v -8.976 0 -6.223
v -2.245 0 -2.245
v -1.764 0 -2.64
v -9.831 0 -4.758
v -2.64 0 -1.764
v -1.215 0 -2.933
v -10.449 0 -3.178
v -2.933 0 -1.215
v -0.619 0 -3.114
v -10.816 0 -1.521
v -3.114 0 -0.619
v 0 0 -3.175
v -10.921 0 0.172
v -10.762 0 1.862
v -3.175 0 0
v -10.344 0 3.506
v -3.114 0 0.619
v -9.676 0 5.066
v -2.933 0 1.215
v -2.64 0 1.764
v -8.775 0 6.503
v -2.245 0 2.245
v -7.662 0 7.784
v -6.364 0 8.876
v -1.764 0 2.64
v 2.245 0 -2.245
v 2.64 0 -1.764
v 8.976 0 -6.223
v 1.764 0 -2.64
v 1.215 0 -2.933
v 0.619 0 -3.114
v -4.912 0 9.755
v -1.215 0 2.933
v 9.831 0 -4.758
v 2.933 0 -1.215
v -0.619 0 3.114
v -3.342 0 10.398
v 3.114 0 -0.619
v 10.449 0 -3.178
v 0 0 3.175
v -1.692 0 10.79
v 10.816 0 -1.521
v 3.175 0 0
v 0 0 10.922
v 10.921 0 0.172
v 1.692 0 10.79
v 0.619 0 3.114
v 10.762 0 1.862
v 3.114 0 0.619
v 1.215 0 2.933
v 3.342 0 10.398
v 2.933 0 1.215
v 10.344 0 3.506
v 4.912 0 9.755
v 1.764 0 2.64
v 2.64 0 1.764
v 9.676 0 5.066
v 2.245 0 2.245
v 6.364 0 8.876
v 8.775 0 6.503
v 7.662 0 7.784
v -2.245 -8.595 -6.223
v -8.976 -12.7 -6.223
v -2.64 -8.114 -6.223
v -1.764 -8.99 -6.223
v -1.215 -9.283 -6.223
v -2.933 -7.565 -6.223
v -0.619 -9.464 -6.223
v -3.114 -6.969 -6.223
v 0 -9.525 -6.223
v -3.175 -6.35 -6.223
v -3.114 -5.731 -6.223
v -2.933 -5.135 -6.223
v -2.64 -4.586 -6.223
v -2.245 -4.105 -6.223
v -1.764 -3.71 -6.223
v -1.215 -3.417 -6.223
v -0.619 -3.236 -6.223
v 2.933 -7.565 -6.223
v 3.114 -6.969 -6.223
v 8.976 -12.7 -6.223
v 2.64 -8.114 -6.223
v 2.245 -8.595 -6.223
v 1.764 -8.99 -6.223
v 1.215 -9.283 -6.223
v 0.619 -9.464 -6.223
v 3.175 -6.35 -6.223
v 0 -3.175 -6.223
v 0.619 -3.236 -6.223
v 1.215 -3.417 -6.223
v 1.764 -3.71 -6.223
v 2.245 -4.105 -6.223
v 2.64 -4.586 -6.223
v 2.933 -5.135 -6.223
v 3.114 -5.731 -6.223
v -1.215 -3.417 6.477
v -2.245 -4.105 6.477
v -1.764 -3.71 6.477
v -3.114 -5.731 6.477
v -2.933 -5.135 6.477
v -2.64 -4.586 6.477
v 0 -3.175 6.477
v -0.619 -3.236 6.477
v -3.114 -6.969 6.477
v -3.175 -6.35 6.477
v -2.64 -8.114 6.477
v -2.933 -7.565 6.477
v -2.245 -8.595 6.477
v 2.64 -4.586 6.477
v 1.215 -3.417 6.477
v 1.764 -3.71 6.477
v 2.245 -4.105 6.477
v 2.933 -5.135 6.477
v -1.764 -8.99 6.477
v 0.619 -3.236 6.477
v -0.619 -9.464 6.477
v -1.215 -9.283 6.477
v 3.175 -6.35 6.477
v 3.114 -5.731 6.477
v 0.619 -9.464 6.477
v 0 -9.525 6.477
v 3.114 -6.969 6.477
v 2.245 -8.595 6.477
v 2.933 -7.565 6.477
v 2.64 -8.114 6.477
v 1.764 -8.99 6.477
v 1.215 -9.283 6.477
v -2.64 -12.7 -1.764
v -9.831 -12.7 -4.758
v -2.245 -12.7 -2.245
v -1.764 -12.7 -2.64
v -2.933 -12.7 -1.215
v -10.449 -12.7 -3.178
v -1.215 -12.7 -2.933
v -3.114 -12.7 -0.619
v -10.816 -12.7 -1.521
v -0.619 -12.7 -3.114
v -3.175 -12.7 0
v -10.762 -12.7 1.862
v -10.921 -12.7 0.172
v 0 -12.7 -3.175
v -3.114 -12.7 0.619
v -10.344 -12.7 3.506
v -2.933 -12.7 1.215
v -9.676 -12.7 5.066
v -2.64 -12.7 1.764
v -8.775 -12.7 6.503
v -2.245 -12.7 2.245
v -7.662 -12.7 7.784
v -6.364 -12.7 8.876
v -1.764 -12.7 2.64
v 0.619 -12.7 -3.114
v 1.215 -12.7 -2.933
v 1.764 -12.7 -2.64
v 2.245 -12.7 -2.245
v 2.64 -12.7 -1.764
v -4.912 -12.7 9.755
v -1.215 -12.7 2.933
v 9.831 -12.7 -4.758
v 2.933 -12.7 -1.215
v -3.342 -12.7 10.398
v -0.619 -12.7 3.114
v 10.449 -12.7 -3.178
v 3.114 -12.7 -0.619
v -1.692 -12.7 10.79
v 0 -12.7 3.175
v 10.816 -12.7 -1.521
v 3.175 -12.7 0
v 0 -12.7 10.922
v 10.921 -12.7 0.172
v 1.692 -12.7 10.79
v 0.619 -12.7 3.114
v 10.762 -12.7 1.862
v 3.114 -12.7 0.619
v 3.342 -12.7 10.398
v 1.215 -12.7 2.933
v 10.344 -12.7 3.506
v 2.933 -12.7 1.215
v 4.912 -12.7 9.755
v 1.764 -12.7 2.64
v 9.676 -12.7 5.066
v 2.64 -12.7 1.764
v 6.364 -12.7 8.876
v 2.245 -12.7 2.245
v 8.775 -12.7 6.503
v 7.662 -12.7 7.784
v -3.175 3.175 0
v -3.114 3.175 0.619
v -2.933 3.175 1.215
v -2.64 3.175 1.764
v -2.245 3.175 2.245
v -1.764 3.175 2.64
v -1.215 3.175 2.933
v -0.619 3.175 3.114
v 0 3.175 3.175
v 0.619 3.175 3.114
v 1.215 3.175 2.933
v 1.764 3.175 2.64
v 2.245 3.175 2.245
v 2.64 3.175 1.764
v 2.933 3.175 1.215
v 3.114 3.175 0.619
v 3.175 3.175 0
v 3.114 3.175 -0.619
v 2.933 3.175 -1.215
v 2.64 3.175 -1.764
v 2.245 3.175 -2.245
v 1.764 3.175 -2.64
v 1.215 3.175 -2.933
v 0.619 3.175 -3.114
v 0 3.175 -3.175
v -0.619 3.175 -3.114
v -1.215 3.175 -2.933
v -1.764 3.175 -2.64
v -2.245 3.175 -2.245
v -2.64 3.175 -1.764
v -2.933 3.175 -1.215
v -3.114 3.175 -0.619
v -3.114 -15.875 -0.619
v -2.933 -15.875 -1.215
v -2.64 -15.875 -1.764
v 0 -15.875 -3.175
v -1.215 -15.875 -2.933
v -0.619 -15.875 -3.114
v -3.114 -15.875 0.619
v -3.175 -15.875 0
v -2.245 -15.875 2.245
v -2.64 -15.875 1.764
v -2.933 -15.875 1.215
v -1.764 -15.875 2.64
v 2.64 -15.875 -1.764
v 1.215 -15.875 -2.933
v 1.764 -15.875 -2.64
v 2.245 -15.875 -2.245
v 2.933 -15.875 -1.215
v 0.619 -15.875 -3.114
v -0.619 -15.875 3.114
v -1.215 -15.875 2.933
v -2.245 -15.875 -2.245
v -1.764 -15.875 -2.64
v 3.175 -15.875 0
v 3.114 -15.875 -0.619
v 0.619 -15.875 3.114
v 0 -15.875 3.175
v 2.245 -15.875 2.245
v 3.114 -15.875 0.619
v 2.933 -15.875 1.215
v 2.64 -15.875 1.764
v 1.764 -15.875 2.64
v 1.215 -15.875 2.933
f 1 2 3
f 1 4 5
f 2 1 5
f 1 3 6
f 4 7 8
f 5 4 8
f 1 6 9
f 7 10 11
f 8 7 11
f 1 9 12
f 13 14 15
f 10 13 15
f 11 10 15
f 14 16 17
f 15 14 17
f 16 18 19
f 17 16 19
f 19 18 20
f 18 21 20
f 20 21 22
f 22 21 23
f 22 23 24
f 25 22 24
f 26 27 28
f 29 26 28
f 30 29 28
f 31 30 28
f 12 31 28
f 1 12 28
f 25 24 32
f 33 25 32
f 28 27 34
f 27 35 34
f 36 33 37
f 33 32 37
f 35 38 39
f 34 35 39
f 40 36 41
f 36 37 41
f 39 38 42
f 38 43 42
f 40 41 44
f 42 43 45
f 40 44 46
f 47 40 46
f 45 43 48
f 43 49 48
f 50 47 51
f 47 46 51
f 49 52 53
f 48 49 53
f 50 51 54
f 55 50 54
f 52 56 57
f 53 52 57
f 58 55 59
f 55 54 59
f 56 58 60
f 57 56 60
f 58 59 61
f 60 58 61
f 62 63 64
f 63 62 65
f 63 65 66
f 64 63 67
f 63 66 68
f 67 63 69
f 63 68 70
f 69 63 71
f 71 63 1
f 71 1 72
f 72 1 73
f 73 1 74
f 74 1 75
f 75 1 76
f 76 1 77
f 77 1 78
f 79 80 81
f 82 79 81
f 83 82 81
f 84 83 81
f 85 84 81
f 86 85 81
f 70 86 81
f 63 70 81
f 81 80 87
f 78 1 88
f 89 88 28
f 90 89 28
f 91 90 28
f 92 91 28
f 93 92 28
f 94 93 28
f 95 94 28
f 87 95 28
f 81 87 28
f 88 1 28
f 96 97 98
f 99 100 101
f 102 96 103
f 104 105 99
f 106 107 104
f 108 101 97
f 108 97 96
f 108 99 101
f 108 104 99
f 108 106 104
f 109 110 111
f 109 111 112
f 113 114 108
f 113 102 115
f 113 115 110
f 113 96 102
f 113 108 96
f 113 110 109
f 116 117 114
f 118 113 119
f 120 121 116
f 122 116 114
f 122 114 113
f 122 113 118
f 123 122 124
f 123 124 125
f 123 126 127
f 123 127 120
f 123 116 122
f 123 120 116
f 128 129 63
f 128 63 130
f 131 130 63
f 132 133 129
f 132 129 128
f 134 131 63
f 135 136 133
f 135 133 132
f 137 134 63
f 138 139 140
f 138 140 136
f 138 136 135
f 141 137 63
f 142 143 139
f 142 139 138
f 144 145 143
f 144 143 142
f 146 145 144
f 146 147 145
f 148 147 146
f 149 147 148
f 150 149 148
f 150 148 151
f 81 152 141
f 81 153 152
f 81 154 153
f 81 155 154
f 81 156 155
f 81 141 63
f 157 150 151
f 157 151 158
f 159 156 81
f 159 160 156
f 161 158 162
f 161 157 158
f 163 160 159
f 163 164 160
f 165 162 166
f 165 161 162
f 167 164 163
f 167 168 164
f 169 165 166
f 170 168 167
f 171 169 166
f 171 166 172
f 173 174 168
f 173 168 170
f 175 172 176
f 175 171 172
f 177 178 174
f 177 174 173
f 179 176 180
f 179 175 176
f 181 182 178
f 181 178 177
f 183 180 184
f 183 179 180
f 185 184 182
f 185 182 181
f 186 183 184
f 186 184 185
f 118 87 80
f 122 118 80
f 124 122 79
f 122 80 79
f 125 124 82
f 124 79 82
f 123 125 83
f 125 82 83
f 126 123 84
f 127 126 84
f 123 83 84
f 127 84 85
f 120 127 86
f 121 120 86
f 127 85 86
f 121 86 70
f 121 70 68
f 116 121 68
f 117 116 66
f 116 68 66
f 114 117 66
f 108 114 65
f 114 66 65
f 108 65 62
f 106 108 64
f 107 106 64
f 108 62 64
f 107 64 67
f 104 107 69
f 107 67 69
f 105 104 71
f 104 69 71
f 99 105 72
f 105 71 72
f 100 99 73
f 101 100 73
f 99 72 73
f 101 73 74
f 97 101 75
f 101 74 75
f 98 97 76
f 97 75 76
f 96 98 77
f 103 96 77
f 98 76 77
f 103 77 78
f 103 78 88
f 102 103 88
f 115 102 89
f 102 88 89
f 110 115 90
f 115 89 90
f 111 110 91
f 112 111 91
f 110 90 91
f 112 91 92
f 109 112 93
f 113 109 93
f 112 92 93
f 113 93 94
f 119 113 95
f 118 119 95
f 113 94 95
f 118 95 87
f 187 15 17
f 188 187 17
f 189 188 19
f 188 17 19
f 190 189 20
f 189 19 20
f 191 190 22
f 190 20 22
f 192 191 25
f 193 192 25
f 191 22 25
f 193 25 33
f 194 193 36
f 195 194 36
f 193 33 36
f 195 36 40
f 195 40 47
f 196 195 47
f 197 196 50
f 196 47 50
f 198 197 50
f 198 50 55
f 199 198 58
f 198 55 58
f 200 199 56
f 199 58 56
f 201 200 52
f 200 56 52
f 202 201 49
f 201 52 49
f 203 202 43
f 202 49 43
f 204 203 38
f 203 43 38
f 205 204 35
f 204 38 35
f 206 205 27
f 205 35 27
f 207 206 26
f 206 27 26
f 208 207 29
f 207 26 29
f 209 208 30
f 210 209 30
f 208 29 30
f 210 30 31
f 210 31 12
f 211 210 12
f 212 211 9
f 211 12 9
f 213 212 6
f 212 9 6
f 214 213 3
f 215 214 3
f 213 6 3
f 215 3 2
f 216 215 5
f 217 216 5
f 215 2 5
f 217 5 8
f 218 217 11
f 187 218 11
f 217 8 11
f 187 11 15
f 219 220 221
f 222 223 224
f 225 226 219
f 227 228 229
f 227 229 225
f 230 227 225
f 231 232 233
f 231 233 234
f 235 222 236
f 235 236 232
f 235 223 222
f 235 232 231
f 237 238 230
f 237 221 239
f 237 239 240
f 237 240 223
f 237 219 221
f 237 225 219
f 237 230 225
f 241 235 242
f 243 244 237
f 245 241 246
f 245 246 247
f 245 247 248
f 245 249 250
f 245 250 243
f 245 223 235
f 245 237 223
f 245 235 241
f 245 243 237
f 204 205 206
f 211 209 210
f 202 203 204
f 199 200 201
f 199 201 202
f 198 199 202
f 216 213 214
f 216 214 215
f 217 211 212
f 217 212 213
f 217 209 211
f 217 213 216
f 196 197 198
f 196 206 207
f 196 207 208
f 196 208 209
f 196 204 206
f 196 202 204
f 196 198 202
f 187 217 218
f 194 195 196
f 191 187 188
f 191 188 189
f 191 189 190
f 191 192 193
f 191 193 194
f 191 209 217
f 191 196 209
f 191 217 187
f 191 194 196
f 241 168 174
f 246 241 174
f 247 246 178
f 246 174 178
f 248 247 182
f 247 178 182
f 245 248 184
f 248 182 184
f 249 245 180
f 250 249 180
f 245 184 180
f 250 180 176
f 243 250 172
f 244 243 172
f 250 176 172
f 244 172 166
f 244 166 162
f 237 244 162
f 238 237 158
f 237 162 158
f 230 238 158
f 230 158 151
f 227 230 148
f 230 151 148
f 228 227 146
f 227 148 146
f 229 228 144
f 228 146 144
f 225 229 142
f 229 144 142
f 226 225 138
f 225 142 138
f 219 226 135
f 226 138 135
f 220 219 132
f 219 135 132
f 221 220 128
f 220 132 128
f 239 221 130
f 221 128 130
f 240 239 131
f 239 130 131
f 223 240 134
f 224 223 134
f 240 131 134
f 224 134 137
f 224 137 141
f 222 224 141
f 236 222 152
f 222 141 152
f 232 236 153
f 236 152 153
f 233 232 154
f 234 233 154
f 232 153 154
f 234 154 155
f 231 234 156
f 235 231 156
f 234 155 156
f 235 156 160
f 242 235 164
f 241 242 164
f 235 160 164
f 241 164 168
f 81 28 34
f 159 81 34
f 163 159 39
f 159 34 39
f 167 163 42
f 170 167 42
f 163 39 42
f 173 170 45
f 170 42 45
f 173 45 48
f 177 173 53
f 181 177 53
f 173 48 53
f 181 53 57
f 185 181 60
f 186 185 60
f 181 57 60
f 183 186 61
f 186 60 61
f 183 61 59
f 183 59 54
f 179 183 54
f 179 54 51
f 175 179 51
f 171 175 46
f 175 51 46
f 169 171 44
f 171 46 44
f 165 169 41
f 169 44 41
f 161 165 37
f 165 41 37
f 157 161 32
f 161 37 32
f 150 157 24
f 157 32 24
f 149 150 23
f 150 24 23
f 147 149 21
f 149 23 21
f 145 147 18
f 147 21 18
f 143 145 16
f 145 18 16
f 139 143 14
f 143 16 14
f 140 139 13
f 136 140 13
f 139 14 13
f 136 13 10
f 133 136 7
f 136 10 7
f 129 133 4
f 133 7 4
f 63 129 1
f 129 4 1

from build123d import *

# Parameters (mm, degrees)
F1_DEPTH = 12.7
F2_R     = 3.175
F3_DEPTH = 3.175
F4_R     = 3.175
F5_DEPTH = 3.175
F6_R     = 3.175
F7_DEPTH = 12.7


with BuildPart() as f1:
    # F0 (on Front) → F1 (new body)
    with BuildSketch(Plane.XZ):
        with BuildLine():
            Line((-8.975765, -6.223), (8.975765, -6.223))
            ThreePointArc((8.975765, -6.223), (0, 10.922), (-8.975765, -6.223))
        make_face()
    extrude(amount=F1_DEPTH)

    # F2 (on face) → F3 (join)
    with BuildSketch(Plane.XZ.offset(12.7)):
        Circle(F2_R)
    extrude(amount=F3_DEPTH)

    # F4 (on face) → F5 (join)
    with BuildSketch(Plane(origin=(0, 0, 0), x_dir=(-1, 0, 0), z_dir=(0, 1, 0))):
        Circle(F4_R)
    extrude(amount=F5_DEPTH)

    # F6 (on face) → F7 (cut)
    with BuildSketch(Plane(origin=(0, 0, -6.223), x_dir=(1, 0, 0), z_dir=(0, 0, -1))):
        with Locations((0, 6.35)):
            Circle(F6_R)
    extrude(amount=-F7_DEPTH, mode=Mode.SUBTRACT)


solid = f1.part
